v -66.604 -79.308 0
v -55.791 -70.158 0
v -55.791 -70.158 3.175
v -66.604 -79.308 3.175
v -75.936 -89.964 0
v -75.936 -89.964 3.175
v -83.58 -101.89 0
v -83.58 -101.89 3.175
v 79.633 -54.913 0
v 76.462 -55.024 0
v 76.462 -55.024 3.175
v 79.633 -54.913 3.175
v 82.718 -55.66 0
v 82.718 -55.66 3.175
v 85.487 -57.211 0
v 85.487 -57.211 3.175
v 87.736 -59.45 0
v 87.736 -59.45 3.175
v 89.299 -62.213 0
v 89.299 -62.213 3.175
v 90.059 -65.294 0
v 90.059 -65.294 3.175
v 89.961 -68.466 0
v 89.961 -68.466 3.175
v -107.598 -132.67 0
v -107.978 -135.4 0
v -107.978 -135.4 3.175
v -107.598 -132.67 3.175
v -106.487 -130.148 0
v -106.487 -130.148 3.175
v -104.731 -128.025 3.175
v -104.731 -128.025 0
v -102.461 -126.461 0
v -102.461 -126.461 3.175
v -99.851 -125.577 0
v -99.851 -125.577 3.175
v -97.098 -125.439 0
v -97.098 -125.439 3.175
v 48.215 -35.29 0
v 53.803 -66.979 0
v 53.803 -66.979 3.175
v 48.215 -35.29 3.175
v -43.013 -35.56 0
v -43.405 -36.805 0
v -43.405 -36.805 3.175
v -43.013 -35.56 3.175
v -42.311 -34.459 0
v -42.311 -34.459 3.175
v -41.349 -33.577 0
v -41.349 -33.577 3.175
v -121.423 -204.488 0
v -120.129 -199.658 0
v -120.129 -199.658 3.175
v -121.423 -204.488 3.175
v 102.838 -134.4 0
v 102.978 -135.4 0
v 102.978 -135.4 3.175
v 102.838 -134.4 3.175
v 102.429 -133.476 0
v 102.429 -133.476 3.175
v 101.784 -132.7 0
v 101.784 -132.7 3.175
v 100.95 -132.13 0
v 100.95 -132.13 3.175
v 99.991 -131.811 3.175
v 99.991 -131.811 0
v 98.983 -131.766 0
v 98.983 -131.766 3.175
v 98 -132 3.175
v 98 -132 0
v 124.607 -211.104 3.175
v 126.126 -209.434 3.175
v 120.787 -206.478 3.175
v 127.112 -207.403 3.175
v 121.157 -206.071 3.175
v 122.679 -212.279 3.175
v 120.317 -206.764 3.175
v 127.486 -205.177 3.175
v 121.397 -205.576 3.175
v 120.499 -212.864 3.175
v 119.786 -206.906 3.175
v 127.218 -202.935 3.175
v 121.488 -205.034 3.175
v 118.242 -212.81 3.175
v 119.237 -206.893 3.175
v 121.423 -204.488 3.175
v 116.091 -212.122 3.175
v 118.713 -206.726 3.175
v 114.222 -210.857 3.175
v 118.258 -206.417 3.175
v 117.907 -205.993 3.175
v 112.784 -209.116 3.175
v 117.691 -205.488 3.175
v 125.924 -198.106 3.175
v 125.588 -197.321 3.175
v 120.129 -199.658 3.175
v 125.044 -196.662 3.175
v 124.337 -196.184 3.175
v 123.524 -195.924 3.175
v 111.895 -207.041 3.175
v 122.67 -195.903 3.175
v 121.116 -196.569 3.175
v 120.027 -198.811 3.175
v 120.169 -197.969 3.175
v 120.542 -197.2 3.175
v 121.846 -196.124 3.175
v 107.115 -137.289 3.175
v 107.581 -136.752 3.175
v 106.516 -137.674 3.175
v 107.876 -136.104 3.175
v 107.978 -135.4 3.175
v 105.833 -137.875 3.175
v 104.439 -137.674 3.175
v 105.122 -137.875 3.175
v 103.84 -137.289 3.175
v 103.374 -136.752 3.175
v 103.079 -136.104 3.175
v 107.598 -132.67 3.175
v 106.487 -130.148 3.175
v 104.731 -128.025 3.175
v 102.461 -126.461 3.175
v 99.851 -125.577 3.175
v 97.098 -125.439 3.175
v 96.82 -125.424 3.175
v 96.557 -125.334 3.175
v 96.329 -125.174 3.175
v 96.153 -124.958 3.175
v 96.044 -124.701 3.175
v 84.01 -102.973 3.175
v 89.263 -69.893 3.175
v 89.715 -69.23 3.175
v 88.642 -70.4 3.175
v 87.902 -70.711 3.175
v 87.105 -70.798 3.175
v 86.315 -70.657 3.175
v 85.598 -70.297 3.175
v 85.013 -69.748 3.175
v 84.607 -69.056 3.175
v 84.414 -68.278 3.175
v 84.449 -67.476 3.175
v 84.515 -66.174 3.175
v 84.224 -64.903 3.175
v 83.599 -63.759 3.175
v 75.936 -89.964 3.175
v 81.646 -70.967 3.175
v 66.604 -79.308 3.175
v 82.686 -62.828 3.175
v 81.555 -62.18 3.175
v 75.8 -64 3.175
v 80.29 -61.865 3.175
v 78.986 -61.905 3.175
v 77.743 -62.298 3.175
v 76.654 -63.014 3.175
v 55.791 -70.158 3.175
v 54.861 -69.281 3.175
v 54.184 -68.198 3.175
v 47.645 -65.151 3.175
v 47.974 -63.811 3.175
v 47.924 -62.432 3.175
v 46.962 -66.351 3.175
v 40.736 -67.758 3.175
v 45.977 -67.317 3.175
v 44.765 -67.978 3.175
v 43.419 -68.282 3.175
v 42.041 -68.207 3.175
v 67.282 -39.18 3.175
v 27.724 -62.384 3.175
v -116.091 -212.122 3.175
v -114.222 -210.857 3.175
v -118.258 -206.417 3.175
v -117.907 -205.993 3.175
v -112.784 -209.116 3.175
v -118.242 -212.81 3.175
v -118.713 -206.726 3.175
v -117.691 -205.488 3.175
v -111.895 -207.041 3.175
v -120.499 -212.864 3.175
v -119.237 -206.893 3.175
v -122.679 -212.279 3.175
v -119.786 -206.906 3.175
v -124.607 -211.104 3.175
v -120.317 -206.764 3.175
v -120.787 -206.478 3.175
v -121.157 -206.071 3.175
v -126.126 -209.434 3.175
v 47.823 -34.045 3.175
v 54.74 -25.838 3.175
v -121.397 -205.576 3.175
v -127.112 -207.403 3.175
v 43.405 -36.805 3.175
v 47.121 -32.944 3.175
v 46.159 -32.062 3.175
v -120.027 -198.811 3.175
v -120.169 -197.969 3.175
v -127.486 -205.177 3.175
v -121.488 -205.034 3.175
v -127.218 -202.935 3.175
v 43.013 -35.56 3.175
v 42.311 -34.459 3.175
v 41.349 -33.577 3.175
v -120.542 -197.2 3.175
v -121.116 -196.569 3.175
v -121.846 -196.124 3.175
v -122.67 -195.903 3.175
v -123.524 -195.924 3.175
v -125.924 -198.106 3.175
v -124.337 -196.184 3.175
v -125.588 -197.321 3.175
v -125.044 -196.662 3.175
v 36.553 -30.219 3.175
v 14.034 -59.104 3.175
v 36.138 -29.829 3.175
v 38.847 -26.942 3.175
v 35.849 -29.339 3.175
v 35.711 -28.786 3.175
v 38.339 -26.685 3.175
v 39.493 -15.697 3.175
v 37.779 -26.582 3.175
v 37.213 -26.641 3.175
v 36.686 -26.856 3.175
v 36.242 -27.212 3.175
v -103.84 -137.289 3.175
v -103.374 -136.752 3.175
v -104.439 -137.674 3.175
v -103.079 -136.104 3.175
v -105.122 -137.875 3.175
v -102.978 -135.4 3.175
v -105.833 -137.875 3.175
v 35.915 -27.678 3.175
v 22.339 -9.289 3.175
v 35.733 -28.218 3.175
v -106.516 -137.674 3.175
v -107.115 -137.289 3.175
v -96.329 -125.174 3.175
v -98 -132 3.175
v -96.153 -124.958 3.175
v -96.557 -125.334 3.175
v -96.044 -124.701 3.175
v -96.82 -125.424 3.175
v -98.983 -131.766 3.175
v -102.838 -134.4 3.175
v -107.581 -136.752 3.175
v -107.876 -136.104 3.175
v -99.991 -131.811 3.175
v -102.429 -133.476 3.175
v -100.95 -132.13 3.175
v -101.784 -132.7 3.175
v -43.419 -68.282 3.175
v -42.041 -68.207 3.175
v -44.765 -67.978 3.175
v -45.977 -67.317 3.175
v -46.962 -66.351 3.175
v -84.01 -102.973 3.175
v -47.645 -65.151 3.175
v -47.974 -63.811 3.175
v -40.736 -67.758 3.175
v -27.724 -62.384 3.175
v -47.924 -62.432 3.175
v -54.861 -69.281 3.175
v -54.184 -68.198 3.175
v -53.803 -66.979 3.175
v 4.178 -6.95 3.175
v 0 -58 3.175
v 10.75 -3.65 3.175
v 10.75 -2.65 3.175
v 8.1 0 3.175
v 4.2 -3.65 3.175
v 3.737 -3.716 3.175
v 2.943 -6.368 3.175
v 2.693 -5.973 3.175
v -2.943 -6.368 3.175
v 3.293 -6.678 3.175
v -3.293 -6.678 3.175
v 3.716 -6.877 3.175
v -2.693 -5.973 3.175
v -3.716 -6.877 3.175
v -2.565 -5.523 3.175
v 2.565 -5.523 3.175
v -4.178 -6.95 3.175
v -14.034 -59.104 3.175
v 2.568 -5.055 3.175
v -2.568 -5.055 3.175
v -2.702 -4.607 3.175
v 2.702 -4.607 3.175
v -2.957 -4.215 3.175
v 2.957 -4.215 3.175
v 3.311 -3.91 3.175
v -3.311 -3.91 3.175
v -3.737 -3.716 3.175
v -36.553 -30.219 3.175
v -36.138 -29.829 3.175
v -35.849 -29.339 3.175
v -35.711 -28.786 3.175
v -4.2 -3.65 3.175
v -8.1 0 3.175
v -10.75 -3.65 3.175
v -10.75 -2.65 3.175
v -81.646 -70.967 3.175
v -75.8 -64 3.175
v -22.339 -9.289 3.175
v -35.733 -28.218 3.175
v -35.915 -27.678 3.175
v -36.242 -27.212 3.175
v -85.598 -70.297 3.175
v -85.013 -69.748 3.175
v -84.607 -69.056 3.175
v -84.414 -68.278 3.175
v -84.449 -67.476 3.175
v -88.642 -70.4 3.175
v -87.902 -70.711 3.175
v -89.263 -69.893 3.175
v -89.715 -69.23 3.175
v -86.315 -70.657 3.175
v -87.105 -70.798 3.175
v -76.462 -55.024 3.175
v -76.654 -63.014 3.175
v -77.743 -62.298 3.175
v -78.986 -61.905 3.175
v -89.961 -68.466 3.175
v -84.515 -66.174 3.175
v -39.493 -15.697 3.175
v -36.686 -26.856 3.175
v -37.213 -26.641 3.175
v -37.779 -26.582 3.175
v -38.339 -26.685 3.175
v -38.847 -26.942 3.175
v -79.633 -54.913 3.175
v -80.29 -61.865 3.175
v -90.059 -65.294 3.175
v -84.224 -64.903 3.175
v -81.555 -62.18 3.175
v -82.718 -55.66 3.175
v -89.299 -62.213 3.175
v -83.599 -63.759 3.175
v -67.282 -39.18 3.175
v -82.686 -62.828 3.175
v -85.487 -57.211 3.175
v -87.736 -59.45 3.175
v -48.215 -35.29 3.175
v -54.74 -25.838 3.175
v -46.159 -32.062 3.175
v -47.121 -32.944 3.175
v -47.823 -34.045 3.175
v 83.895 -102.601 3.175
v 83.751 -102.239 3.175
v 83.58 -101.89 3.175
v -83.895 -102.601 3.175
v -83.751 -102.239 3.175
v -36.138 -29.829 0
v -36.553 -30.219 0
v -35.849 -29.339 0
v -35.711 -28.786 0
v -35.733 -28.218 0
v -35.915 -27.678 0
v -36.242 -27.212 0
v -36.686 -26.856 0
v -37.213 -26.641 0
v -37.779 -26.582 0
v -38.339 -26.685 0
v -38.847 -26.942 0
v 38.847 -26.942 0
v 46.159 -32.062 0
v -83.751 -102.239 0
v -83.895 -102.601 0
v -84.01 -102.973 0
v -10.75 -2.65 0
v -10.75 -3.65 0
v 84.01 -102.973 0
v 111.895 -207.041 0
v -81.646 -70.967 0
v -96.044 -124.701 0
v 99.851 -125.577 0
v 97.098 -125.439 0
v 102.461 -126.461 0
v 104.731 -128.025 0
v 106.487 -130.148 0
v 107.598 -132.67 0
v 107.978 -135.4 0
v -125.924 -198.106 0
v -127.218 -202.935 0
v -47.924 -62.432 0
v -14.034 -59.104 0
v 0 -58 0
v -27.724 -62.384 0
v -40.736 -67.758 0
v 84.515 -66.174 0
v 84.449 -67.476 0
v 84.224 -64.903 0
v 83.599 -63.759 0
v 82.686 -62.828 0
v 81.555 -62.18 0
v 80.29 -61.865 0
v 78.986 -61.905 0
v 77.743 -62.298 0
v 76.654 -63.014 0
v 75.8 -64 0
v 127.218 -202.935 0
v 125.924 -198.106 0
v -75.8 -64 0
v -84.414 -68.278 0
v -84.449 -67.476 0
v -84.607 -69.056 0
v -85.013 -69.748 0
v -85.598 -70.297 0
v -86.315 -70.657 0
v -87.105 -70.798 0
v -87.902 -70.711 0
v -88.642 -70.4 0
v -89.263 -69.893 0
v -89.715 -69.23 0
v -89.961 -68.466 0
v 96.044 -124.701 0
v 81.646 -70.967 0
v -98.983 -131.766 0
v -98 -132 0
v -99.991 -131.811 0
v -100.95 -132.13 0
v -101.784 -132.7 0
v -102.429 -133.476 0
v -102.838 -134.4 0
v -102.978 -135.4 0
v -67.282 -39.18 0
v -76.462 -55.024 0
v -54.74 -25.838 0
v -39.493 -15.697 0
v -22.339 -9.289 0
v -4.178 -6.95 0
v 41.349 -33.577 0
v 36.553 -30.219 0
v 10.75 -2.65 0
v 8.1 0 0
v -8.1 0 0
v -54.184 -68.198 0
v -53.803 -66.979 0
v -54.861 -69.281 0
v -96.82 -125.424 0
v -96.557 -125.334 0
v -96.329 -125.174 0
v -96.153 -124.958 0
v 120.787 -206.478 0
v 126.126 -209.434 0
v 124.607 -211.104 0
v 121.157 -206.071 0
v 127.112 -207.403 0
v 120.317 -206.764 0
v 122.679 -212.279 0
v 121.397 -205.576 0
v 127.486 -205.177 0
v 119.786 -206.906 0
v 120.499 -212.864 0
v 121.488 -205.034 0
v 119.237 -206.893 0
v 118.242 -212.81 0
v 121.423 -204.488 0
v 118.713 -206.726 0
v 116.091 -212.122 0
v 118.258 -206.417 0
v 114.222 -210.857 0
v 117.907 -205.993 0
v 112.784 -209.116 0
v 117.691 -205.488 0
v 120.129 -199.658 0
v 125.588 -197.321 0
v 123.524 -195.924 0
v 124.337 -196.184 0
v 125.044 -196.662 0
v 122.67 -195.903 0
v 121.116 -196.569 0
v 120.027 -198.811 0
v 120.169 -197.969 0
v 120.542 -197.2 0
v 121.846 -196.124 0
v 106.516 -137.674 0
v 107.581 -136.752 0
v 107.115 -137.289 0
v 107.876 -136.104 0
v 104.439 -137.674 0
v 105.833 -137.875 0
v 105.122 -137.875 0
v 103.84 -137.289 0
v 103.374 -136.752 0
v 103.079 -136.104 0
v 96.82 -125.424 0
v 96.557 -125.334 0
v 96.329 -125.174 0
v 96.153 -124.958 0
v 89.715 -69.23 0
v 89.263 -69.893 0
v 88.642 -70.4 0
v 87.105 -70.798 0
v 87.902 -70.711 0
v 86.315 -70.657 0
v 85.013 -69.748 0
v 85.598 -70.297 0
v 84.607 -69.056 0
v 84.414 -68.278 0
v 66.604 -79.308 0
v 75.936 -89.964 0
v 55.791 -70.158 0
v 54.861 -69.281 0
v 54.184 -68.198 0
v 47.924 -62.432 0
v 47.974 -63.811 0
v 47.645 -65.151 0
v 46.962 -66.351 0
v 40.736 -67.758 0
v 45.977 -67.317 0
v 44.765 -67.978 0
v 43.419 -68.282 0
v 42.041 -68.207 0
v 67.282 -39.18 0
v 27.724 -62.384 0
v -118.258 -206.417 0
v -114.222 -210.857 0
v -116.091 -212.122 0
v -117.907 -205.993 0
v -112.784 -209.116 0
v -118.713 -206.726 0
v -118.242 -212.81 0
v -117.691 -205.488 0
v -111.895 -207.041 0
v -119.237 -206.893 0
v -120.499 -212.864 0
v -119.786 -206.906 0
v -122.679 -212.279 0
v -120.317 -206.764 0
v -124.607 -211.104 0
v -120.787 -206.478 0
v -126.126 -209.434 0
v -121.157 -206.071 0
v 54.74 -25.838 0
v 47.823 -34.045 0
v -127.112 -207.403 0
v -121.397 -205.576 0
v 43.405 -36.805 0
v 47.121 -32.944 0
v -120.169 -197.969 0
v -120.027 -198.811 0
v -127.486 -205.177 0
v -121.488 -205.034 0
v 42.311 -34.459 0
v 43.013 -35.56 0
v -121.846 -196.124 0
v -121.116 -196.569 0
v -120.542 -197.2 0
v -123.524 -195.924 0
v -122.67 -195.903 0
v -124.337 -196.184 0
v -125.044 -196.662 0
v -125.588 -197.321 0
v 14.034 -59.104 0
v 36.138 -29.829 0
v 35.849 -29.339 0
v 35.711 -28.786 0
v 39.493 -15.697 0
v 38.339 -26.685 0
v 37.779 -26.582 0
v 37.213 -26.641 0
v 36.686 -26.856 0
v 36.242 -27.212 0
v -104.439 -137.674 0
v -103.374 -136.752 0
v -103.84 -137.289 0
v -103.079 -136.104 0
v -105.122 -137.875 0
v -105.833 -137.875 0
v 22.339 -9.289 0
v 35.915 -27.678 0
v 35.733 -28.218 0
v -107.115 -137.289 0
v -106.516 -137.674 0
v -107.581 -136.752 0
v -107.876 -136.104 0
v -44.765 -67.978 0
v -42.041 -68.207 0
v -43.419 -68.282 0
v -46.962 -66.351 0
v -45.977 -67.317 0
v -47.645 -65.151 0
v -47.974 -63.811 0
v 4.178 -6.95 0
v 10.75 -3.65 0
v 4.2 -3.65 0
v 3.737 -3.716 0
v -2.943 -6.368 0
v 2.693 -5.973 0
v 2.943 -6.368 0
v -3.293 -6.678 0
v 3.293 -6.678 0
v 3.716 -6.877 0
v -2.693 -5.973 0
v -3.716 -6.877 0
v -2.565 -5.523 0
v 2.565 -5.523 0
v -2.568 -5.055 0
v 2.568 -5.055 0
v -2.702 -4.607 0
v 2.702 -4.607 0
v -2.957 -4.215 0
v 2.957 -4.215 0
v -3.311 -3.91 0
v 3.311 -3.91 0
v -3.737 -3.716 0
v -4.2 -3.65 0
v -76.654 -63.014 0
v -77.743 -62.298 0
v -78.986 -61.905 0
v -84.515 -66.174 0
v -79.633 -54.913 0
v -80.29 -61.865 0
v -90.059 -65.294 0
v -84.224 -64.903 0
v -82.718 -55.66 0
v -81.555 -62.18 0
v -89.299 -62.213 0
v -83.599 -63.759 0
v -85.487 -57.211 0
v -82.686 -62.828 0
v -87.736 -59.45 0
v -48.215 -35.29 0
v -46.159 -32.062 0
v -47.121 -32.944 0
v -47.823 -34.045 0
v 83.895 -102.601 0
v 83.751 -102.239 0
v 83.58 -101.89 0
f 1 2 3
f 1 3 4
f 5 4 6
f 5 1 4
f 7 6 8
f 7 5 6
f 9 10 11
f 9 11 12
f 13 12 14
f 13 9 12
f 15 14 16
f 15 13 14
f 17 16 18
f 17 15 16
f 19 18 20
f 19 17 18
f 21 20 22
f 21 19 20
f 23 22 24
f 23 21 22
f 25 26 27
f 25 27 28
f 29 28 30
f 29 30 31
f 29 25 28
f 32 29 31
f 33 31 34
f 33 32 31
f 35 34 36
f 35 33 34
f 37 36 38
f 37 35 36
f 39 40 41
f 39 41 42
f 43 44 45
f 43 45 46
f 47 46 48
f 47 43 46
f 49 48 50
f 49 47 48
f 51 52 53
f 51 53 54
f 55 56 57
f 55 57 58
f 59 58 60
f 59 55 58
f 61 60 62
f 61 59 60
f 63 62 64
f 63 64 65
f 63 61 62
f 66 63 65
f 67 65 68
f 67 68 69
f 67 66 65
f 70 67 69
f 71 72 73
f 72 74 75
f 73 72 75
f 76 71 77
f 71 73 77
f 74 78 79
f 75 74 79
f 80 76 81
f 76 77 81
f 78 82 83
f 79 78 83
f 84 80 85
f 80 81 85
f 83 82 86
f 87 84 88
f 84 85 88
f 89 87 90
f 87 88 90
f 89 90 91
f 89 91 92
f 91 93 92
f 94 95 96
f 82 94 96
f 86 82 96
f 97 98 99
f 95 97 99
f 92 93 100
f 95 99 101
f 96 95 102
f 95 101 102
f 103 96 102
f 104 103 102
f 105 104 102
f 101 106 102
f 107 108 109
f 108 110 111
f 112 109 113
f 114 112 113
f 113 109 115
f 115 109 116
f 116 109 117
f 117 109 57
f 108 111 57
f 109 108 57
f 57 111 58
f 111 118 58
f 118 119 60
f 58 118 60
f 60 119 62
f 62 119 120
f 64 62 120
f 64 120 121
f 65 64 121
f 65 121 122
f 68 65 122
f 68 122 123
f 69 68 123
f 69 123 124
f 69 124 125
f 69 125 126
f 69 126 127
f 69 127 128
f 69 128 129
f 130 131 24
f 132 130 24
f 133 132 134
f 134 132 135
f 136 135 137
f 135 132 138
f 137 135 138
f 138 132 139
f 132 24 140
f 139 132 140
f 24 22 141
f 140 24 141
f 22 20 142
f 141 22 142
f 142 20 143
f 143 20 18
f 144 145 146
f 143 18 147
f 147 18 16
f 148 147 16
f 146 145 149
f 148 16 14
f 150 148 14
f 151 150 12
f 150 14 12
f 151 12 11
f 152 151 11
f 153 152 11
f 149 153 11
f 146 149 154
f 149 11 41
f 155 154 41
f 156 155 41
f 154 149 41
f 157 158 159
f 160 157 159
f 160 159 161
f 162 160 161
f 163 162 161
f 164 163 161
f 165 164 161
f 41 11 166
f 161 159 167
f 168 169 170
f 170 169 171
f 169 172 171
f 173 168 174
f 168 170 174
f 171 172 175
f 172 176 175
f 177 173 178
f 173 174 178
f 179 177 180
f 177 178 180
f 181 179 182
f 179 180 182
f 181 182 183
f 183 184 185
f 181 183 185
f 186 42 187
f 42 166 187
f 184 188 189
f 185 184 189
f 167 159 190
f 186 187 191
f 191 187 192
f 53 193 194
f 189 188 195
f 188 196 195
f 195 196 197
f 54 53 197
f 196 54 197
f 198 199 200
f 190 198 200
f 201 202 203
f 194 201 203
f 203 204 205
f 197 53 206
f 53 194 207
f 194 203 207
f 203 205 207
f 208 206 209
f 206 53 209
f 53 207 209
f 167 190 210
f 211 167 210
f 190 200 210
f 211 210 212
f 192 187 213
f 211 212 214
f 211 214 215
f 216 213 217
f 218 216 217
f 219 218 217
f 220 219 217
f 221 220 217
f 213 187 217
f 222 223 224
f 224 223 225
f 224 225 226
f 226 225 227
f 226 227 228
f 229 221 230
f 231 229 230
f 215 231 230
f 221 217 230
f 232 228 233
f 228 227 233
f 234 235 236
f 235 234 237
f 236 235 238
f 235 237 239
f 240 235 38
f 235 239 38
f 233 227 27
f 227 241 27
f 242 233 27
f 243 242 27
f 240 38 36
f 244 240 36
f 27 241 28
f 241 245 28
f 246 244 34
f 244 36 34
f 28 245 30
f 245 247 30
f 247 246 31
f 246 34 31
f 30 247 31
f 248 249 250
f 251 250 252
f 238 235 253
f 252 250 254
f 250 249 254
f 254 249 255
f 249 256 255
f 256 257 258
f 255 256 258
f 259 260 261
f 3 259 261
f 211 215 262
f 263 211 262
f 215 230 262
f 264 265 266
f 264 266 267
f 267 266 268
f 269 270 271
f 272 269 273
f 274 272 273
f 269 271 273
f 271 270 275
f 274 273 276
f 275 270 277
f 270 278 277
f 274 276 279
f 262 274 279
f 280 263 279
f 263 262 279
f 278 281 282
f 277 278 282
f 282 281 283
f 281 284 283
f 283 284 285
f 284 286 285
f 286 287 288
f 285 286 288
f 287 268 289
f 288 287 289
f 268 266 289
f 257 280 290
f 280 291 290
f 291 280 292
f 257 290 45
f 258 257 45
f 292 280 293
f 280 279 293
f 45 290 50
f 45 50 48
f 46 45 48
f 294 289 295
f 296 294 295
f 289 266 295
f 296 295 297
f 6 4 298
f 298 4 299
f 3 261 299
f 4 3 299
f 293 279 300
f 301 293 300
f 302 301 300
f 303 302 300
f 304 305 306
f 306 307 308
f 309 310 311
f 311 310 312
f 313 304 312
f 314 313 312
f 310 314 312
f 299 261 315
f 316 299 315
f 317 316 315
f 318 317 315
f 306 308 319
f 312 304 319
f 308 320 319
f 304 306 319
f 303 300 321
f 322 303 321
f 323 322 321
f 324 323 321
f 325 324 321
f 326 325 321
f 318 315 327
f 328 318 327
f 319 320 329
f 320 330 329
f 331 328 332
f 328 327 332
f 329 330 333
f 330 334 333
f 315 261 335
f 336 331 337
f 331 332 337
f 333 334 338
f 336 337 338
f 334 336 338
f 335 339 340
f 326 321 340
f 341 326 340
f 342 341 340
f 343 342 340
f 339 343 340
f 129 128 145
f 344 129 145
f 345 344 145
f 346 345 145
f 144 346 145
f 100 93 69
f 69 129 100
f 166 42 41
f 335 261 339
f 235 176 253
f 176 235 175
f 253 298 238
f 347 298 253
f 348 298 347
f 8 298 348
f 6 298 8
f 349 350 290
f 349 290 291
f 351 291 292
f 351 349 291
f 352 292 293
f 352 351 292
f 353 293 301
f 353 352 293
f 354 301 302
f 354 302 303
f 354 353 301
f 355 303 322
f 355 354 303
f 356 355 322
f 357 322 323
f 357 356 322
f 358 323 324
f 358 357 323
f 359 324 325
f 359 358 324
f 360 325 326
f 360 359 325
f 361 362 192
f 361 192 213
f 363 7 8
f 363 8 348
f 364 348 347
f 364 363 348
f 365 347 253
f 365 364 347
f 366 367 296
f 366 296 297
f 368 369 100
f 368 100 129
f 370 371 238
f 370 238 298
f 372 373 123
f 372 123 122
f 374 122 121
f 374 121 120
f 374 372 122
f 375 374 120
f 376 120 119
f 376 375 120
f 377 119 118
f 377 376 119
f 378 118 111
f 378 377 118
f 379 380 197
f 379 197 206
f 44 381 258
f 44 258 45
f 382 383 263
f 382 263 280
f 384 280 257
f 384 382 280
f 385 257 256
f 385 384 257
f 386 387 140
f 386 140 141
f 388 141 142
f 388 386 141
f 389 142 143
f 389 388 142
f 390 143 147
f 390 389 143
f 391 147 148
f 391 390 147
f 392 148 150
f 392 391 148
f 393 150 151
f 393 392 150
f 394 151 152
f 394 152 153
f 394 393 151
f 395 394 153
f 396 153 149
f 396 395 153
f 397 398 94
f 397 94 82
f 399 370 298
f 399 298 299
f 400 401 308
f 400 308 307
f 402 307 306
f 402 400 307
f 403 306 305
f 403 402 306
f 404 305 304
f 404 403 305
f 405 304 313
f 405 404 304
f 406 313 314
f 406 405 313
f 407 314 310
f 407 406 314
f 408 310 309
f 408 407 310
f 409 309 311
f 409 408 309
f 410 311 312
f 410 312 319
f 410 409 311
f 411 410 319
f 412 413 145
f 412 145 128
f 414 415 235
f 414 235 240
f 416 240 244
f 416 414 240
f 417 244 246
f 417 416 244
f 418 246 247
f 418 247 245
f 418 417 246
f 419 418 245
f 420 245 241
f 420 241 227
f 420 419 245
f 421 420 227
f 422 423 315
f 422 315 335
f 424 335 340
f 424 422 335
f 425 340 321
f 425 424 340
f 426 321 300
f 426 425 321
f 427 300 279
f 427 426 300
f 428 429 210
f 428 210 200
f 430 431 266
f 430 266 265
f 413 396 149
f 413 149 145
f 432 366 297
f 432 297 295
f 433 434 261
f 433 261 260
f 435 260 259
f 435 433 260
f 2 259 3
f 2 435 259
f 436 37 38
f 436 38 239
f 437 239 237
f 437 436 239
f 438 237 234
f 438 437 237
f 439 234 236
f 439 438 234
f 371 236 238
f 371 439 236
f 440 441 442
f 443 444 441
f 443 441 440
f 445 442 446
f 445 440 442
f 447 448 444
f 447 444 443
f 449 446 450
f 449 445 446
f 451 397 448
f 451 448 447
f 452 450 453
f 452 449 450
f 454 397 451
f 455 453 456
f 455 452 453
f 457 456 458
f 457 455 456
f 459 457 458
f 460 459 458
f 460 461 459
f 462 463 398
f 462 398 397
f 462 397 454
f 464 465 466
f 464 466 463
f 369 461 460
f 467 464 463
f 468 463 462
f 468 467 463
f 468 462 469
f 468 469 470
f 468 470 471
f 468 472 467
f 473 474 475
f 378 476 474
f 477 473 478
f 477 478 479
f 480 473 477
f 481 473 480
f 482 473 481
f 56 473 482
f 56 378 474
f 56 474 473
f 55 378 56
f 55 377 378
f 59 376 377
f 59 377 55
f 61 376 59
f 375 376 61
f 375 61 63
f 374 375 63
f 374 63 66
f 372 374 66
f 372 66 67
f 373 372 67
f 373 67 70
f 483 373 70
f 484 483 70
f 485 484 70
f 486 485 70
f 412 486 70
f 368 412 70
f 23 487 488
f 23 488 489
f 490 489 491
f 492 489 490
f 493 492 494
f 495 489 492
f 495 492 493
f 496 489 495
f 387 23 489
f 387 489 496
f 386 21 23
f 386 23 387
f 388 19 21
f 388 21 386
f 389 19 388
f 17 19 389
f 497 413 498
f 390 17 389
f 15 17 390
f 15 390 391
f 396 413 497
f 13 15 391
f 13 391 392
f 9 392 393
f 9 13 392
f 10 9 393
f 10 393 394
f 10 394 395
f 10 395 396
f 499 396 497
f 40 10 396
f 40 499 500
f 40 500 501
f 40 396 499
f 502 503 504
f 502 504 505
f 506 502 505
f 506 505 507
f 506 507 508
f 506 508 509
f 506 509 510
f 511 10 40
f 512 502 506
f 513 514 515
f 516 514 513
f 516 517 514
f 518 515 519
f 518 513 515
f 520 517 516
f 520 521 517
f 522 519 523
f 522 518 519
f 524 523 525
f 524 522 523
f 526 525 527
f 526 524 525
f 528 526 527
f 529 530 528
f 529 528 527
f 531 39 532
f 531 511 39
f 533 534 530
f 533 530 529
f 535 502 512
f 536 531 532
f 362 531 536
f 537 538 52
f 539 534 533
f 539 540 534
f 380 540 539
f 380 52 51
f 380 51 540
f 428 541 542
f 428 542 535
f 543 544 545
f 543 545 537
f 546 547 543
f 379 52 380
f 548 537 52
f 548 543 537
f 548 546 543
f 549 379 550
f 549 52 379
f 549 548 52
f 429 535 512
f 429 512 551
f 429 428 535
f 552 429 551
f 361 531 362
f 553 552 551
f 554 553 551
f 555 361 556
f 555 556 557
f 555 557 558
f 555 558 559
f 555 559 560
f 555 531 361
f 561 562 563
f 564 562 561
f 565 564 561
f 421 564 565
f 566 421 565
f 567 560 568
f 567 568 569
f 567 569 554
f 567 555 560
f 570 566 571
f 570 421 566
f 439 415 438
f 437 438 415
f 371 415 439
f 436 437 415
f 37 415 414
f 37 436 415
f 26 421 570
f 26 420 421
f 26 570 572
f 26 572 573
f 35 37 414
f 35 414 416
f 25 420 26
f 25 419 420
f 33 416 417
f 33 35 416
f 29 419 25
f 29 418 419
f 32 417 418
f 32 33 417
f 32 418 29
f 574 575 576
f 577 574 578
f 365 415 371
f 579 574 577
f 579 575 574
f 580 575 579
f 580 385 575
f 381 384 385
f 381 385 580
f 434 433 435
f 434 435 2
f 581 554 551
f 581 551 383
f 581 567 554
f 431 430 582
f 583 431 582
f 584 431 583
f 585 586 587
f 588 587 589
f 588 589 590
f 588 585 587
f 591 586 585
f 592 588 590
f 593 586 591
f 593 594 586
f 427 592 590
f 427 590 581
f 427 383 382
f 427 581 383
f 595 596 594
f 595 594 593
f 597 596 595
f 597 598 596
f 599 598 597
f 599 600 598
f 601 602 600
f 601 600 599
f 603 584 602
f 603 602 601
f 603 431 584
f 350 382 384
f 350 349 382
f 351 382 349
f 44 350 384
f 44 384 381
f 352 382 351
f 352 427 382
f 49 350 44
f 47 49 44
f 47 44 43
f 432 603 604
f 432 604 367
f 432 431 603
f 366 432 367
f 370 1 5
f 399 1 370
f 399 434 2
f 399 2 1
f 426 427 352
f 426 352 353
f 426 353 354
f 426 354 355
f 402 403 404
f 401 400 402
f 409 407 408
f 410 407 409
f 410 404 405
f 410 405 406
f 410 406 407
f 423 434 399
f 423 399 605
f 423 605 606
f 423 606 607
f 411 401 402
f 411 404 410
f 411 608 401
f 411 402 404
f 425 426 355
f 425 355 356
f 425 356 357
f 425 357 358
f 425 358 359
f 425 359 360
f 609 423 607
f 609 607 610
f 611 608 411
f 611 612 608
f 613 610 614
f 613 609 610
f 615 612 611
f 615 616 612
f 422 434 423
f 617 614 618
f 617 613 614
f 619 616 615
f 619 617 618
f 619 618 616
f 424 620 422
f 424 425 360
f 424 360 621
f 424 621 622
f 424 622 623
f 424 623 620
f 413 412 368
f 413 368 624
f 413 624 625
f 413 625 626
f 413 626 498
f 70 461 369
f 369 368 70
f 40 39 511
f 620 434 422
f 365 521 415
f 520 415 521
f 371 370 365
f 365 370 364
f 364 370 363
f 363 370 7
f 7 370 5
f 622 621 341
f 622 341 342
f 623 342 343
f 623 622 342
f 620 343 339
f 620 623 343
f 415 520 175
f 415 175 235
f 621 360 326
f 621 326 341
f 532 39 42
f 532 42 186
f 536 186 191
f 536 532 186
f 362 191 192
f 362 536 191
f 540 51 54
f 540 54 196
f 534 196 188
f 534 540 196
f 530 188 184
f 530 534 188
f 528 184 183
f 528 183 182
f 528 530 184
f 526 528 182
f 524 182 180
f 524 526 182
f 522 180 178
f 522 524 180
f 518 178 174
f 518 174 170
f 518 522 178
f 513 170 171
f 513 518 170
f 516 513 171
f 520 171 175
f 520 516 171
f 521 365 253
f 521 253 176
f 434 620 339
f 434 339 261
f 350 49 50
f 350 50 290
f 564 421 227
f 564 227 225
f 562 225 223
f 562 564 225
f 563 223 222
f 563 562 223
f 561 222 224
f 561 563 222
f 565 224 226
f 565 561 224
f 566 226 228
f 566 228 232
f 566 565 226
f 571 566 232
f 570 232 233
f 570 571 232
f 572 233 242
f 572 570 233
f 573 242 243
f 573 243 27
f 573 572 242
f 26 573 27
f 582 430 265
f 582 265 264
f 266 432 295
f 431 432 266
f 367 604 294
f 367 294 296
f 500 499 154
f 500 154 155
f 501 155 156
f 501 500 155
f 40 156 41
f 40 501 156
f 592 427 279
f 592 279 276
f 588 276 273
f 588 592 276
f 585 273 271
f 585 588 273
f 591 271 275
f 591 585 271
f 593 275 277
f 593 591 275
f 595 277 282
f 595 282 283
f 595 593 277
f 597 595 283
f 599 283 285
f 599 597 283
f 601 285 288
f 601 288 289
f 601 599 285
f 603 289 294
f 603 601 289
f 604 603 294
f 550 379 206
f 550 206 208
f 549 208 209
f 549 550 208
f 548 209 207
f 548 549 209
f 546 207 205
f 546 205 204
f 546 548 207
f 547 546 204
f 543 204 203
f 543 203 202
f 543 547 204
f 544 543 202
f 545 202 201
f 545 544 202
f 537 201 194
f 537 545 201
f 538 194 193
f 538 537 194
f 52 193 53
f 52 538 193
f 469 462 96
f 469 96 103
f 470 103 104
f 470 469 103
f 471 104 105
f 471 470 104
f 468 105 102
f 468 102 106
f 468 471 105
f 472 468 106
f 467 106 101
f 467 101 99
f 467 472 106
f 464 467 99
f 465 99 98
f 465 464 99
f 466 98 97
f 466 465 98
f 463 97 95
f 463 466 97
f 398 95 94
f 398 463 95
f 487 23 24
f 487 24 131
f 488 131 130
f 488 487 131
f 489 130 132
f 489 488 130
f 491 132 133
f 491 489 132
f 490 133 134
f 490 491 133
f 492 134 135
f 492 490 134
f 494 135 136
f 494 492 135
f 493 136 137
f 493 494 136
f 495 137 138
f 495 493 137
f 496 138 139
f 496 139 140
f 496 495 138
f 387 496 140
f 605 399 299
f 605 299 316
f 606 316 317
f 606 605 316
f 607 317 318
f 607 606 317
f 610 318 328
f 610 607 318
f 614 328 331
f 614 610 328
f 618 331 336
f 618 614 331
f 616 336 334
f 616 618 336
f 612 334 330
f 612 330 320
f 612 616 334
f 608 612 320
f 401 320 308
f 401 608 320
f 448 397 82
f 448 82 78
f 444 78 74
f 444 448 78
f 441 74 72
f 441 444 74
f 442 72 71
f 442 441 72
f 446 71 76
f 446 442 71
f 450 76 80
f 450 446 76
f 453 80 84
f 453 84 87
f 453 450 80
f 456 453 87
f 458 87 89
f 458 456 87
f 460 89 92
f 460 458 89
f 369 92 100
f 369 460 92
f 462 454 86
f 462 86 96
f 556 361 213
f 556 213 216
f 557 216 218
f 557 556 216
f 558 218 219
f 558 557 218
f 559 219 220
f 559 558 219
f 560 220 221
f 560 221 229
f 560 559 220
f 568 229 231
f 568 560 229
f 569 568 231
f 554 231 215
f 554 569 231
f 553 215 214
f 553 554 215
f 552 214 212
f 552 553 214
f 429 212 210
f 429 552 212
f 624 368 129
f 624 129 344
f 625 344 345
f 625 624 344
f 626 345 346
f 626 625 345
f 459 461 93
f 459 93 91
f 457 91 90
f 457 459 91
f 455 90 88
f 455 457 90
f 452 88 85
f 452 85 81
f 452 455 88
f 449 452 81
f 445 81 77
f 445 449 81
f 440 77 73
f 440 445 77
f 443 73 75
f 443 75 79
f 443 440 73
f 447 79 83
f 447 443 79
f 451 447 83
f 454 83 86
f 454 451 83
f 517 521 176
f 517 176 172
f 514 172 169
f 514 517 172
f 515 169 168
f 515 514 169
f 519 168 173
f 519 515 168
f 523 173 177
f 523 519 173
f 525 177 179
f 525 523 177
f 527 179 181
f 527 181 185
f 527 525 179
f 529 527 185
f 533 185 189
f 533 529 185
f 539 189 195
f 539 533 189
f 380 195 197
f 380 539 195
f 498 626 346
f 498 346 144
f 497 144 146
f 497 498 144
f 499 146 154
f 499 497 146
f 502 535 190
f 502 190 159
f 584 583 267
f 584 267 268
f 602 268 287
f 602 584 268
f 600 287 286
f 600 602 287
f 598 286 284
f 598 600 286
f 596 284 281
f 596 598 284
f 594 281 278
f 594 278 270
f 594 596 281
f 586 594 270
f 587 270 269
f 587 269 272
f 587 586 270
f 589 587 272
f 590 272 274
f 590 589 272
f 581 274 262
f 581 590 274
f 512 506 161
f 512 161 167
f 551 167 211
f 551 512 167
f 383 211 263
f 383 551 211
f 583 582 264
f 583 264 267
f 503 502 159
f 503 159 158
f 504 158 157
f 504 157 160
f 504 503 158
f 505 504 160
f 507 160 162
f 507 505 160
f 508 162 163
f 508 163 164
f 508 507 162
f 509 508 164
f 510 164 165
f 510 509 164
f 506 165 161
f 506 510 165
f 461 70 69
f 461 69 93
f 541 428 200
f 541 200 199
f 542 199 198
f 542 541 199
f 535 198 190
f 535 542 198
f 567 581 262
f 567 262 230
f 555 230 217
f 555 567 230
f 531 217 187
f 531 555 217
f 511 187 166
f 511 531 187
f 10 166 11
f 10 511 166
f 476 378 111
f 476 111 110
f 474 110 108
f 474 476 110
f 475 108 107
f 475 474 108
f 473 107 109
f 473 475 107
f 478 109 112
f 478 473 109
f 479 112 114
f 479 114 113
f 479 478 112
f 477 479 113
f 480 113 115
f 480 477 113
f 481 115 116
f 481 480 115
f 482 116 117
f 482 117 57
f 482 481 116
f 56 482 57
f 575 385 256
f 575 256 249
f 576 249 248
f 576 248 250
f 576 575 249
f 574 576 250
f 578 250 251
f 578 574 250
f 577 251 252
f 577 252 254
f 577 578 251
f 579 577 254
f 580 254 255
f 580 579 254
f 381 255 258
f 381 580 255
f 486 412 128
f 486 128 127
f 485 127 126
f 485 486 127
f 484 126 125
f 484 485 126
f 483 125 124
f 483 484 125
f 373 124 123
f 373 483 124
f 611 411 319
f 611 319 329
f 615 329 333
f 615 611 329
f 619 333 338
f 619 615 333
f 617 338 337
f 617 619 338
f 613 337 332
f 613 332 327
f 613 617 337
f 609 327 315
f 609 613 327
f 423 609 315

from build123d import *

# Parameters (mm, degrees)
BOSS_EXTRUDE1_DEPTH = 3.175


with BuildPart() as part:
    # Sketch1 → Boss-Extrude1 (new body)
    with BuildSketch(Plane.XY):
        with BuildLine():
            Line((-8.1, 0), (8.1, 0))
            Line((8.1, 0), (10.75, -2.65))
            Line((10.75, -2.65), (10.75, -3.65))
            Line((10.75, -3.65), (4.2, -3.65))
            ThreePointArc((4.2, -3.65), (2.550037108, -5.288934004), (4.177868505, -6.949851568))
            ThreePointArc((4.177868505, -6.949851568), (47.407650937, -20.329895347), (76.461639413, -55.024353322))
            ThreePointArc((76.461639413, -55.024353322), (86.688165284, -58.25355516), (89.960911147, -68.466229169))
            ThreePointArc((89.960911147, -68.466229169), (86.704969014, -70.755892654), (84.44942629, -67.476221165))
            ThreePointArc((84.44942629, -67.476221165), (81.554604124, -62.18029995), (75.8, -64))
            Line((75.8, -64), (81.646374133, -70.967437377))
            Line((81.646374133, -70.967437377), (96.044354863, -124.701432988))
            ThreePointArc((96.044354863, -124.701432988), (96.437025669, -125.261990951), (97.098218064, -125.438739948))
            ThreePointArc((97.098218064, -125.438739948), (104.73060086, -128.02457671), (107.977591805, -135.4))
            ThreePointArc((107.977591805, -135.4), (105.477591805, -137.9), (102.977591805, -135.4))
            ThreePointArc((102.977591805, -135.4), (101.386328057, -132.386015089), (98, -132))
            Line((98, -132), (117.691047305, -205.487988996))
            ThreePointArc((117.691047305, -205.487988996), (120.056868172, -206.85389631), (121.422775486, -204.488075443))
            Line((121.422775486, -204.488075443), (120.128680261, -199.658446312))
            ThreePointArc((120.128680261, -199.658446312), (122.250000605, -195.984211697), (125.924235219, -198.105532041))
            Line((125.924235219, -198.105532041), (127.218330444, -202.935161172))
            ThreePointArc((127.218330444, -202.935161172), (121.609782443, -212.649451268), (111.895492347, -207.040903266))
            Line((111.895492347, -207.040903266), (84.010461962, -102.9725531))
            ThreePointArc((84.010461962, -102.9725531), (83.826764804, -102.418590939), (83.579767988, -101.889808095))
            ThreePointArc((83.579767988, -101.889808095), (71.468601459, -84.461922175), (55.79064441, -70.157614254))
            ThreePointArc((55.79064441, -70.157614254), (54.487597498, -68.761604863), (53.802955351, -66.978899446))
            Line((53.802955351, -66.978899446), (48.2152775, -35.289603638))
            ThreePointArc((48.2152775, -35.289603638), (47.508195964, -33.471346485), (46.159120917, -32.062084305))
            Line((46.159120917, -32.062084305), (38.847152873, -26.942189162))
            ThreePointArc((38.847152873, -26.942189162), (36.061695911, -27.433340377), (36.552847127, -30.218797339))
            Line((36.552847127, -30.218797339), (41.349143695, -33.577200351))
            ThreePointArc((41.349143695, -33.577200351), (42.698218742, -34.986462531), (43.405300278, -36.804719684))
            Line((43.405300278, -36.804719684), (47.924038765, -62.431759112))
            ThreePointArc((47.924038765, -62.431759112), (45.976650255, -67.317406285), (40.735673212, -67.757894593))
            ThreePointArc((40.735673212, -67.757894593), (20.943431619, -60.476046738), (0, -58))
            ThreePointArc((0, -58), (-20.943431619, -60.476046738), (-40.735673212, -67.757894593))
            ThreePointArc((-40.735673212, -67.757894593), (-45.976650255, -67.317406285), (-47.924038765, -62.431759112))
            Line((-47.924038765, -62.431759112), (-43.405300278, -36.804719684))
            ThreePointArc((-43.405300278, -36.804719684), (-42.698218742, -34.986462531), (-41.349143695, -33.577200351))
            Line((-41.349143695, -33.577200351), (-36.552847127, -30.218797339))
            ThreePointArc((-36.552847127, -30.218797339), (-36.061695911, -27.433340377), (-38.847152873, -26.942189162))
            Line((-38.847152873, -26.942189162), (-46.159120917, -32.062084305))
            ThreePointArc((-46.159120917, -32.062084305), (-47.508195964, -33.471346485), (-48.2152775, -35.289603638))
            Line((-48.2152775, -35.289603638), (-53.802955351, -66.978899446))
            ThreePointArc((-53.802955351, -66.978899446), (-54.487597498, -68.761604863), (-55.79064441, -70.157614254))
            ThreePointArc((-55.79064441, -70.157614254), (-71.468601459, -84.461922175), (-83.579767988, -101.889808095))
            ThreePointArc((-83.579767988, -101.889808095), (-83.826764804, -102.418590939), (-84.010461962, -102.9725531))
            Line((-84.010461962, -102.9725531), (-111.895492347, -207.040903266))
            ThreePointArc((-111.895492347, -207.040903266), (-121.609782443, -212.649451268), (-127.218330444, -202.935161172))
            Line((-127.218330444, -202.935161172), (-125.924235219, -198.105532041))
            ThreePointArc((-125.924235219, -198.105532041), (-122.250000605, -195.984211697), (-120.128680261, -199.658446312))
            Line((-120.128680261, -199.658446312), (-121.422775486, -204.488075443))
            ThreePointArc((-121.422775486, -204.488075443), (-120.056868172, -206.85389631), (-117.691047305, -205.487988996))
            Line((-117.691047305, -205.487988996), (-98, -132))
            ThreePointArc((-98, -132), (-101.386328057, -132.386015089), (-102.977591805, -135.4))
            ThreePointArc((-102.977591805, -135.4), (-105.477591805, -137.9), (-107.977591805, -135.4))
            ThreePointArc((-107.977591805, -135.4), (-104.73060086, -128.02457671), (-97.098218064, -125.438739948))
            ThreePointArc((-97.098218064, -125.438739948), (-96.437025669, -125.261990951), (-96.044354863, -124.701432988))
            Line((-96.044354863, -124.701432988), (-81.646374133, -70.967437377))
            Line((-81.646374133, -70.967437377), (-75.8, -64))
            ThreePointArc((-75.8, -64), (-81.554604124, -62.18029995), (-84.44942629, -67.476221165))
            ThreePointArc((-84.44942629, -67.476221165), (-86.704969014, -70.755892654), (-89.960911147, -68.466229169))
            ThreePointArc((-89.960911147, -68.466229169), (-86.688165284, -58.25355516), (-76.461639413, -55.024353322))
            ThreePointArc((-76.461639413, -55.024353322), (-47.407650937, -20.329895347), (-4.177868505, -6.949851568))
            ThreePointArc((-4.177868505, -6.949851568), (-2.550037108, -5.288934004), (-4.2, -3.65))
            Line((-4.2, -3.65), (-10.75, -3.65))
            Line((-10.75, -3.65), (-10.75, -2.65))
            Line((-10.75, -2.65), (-8.1, 0))
        make_face()
    extrude(amount=BOSS_EXTRUDE1_DEPTH)


solid = part.part
